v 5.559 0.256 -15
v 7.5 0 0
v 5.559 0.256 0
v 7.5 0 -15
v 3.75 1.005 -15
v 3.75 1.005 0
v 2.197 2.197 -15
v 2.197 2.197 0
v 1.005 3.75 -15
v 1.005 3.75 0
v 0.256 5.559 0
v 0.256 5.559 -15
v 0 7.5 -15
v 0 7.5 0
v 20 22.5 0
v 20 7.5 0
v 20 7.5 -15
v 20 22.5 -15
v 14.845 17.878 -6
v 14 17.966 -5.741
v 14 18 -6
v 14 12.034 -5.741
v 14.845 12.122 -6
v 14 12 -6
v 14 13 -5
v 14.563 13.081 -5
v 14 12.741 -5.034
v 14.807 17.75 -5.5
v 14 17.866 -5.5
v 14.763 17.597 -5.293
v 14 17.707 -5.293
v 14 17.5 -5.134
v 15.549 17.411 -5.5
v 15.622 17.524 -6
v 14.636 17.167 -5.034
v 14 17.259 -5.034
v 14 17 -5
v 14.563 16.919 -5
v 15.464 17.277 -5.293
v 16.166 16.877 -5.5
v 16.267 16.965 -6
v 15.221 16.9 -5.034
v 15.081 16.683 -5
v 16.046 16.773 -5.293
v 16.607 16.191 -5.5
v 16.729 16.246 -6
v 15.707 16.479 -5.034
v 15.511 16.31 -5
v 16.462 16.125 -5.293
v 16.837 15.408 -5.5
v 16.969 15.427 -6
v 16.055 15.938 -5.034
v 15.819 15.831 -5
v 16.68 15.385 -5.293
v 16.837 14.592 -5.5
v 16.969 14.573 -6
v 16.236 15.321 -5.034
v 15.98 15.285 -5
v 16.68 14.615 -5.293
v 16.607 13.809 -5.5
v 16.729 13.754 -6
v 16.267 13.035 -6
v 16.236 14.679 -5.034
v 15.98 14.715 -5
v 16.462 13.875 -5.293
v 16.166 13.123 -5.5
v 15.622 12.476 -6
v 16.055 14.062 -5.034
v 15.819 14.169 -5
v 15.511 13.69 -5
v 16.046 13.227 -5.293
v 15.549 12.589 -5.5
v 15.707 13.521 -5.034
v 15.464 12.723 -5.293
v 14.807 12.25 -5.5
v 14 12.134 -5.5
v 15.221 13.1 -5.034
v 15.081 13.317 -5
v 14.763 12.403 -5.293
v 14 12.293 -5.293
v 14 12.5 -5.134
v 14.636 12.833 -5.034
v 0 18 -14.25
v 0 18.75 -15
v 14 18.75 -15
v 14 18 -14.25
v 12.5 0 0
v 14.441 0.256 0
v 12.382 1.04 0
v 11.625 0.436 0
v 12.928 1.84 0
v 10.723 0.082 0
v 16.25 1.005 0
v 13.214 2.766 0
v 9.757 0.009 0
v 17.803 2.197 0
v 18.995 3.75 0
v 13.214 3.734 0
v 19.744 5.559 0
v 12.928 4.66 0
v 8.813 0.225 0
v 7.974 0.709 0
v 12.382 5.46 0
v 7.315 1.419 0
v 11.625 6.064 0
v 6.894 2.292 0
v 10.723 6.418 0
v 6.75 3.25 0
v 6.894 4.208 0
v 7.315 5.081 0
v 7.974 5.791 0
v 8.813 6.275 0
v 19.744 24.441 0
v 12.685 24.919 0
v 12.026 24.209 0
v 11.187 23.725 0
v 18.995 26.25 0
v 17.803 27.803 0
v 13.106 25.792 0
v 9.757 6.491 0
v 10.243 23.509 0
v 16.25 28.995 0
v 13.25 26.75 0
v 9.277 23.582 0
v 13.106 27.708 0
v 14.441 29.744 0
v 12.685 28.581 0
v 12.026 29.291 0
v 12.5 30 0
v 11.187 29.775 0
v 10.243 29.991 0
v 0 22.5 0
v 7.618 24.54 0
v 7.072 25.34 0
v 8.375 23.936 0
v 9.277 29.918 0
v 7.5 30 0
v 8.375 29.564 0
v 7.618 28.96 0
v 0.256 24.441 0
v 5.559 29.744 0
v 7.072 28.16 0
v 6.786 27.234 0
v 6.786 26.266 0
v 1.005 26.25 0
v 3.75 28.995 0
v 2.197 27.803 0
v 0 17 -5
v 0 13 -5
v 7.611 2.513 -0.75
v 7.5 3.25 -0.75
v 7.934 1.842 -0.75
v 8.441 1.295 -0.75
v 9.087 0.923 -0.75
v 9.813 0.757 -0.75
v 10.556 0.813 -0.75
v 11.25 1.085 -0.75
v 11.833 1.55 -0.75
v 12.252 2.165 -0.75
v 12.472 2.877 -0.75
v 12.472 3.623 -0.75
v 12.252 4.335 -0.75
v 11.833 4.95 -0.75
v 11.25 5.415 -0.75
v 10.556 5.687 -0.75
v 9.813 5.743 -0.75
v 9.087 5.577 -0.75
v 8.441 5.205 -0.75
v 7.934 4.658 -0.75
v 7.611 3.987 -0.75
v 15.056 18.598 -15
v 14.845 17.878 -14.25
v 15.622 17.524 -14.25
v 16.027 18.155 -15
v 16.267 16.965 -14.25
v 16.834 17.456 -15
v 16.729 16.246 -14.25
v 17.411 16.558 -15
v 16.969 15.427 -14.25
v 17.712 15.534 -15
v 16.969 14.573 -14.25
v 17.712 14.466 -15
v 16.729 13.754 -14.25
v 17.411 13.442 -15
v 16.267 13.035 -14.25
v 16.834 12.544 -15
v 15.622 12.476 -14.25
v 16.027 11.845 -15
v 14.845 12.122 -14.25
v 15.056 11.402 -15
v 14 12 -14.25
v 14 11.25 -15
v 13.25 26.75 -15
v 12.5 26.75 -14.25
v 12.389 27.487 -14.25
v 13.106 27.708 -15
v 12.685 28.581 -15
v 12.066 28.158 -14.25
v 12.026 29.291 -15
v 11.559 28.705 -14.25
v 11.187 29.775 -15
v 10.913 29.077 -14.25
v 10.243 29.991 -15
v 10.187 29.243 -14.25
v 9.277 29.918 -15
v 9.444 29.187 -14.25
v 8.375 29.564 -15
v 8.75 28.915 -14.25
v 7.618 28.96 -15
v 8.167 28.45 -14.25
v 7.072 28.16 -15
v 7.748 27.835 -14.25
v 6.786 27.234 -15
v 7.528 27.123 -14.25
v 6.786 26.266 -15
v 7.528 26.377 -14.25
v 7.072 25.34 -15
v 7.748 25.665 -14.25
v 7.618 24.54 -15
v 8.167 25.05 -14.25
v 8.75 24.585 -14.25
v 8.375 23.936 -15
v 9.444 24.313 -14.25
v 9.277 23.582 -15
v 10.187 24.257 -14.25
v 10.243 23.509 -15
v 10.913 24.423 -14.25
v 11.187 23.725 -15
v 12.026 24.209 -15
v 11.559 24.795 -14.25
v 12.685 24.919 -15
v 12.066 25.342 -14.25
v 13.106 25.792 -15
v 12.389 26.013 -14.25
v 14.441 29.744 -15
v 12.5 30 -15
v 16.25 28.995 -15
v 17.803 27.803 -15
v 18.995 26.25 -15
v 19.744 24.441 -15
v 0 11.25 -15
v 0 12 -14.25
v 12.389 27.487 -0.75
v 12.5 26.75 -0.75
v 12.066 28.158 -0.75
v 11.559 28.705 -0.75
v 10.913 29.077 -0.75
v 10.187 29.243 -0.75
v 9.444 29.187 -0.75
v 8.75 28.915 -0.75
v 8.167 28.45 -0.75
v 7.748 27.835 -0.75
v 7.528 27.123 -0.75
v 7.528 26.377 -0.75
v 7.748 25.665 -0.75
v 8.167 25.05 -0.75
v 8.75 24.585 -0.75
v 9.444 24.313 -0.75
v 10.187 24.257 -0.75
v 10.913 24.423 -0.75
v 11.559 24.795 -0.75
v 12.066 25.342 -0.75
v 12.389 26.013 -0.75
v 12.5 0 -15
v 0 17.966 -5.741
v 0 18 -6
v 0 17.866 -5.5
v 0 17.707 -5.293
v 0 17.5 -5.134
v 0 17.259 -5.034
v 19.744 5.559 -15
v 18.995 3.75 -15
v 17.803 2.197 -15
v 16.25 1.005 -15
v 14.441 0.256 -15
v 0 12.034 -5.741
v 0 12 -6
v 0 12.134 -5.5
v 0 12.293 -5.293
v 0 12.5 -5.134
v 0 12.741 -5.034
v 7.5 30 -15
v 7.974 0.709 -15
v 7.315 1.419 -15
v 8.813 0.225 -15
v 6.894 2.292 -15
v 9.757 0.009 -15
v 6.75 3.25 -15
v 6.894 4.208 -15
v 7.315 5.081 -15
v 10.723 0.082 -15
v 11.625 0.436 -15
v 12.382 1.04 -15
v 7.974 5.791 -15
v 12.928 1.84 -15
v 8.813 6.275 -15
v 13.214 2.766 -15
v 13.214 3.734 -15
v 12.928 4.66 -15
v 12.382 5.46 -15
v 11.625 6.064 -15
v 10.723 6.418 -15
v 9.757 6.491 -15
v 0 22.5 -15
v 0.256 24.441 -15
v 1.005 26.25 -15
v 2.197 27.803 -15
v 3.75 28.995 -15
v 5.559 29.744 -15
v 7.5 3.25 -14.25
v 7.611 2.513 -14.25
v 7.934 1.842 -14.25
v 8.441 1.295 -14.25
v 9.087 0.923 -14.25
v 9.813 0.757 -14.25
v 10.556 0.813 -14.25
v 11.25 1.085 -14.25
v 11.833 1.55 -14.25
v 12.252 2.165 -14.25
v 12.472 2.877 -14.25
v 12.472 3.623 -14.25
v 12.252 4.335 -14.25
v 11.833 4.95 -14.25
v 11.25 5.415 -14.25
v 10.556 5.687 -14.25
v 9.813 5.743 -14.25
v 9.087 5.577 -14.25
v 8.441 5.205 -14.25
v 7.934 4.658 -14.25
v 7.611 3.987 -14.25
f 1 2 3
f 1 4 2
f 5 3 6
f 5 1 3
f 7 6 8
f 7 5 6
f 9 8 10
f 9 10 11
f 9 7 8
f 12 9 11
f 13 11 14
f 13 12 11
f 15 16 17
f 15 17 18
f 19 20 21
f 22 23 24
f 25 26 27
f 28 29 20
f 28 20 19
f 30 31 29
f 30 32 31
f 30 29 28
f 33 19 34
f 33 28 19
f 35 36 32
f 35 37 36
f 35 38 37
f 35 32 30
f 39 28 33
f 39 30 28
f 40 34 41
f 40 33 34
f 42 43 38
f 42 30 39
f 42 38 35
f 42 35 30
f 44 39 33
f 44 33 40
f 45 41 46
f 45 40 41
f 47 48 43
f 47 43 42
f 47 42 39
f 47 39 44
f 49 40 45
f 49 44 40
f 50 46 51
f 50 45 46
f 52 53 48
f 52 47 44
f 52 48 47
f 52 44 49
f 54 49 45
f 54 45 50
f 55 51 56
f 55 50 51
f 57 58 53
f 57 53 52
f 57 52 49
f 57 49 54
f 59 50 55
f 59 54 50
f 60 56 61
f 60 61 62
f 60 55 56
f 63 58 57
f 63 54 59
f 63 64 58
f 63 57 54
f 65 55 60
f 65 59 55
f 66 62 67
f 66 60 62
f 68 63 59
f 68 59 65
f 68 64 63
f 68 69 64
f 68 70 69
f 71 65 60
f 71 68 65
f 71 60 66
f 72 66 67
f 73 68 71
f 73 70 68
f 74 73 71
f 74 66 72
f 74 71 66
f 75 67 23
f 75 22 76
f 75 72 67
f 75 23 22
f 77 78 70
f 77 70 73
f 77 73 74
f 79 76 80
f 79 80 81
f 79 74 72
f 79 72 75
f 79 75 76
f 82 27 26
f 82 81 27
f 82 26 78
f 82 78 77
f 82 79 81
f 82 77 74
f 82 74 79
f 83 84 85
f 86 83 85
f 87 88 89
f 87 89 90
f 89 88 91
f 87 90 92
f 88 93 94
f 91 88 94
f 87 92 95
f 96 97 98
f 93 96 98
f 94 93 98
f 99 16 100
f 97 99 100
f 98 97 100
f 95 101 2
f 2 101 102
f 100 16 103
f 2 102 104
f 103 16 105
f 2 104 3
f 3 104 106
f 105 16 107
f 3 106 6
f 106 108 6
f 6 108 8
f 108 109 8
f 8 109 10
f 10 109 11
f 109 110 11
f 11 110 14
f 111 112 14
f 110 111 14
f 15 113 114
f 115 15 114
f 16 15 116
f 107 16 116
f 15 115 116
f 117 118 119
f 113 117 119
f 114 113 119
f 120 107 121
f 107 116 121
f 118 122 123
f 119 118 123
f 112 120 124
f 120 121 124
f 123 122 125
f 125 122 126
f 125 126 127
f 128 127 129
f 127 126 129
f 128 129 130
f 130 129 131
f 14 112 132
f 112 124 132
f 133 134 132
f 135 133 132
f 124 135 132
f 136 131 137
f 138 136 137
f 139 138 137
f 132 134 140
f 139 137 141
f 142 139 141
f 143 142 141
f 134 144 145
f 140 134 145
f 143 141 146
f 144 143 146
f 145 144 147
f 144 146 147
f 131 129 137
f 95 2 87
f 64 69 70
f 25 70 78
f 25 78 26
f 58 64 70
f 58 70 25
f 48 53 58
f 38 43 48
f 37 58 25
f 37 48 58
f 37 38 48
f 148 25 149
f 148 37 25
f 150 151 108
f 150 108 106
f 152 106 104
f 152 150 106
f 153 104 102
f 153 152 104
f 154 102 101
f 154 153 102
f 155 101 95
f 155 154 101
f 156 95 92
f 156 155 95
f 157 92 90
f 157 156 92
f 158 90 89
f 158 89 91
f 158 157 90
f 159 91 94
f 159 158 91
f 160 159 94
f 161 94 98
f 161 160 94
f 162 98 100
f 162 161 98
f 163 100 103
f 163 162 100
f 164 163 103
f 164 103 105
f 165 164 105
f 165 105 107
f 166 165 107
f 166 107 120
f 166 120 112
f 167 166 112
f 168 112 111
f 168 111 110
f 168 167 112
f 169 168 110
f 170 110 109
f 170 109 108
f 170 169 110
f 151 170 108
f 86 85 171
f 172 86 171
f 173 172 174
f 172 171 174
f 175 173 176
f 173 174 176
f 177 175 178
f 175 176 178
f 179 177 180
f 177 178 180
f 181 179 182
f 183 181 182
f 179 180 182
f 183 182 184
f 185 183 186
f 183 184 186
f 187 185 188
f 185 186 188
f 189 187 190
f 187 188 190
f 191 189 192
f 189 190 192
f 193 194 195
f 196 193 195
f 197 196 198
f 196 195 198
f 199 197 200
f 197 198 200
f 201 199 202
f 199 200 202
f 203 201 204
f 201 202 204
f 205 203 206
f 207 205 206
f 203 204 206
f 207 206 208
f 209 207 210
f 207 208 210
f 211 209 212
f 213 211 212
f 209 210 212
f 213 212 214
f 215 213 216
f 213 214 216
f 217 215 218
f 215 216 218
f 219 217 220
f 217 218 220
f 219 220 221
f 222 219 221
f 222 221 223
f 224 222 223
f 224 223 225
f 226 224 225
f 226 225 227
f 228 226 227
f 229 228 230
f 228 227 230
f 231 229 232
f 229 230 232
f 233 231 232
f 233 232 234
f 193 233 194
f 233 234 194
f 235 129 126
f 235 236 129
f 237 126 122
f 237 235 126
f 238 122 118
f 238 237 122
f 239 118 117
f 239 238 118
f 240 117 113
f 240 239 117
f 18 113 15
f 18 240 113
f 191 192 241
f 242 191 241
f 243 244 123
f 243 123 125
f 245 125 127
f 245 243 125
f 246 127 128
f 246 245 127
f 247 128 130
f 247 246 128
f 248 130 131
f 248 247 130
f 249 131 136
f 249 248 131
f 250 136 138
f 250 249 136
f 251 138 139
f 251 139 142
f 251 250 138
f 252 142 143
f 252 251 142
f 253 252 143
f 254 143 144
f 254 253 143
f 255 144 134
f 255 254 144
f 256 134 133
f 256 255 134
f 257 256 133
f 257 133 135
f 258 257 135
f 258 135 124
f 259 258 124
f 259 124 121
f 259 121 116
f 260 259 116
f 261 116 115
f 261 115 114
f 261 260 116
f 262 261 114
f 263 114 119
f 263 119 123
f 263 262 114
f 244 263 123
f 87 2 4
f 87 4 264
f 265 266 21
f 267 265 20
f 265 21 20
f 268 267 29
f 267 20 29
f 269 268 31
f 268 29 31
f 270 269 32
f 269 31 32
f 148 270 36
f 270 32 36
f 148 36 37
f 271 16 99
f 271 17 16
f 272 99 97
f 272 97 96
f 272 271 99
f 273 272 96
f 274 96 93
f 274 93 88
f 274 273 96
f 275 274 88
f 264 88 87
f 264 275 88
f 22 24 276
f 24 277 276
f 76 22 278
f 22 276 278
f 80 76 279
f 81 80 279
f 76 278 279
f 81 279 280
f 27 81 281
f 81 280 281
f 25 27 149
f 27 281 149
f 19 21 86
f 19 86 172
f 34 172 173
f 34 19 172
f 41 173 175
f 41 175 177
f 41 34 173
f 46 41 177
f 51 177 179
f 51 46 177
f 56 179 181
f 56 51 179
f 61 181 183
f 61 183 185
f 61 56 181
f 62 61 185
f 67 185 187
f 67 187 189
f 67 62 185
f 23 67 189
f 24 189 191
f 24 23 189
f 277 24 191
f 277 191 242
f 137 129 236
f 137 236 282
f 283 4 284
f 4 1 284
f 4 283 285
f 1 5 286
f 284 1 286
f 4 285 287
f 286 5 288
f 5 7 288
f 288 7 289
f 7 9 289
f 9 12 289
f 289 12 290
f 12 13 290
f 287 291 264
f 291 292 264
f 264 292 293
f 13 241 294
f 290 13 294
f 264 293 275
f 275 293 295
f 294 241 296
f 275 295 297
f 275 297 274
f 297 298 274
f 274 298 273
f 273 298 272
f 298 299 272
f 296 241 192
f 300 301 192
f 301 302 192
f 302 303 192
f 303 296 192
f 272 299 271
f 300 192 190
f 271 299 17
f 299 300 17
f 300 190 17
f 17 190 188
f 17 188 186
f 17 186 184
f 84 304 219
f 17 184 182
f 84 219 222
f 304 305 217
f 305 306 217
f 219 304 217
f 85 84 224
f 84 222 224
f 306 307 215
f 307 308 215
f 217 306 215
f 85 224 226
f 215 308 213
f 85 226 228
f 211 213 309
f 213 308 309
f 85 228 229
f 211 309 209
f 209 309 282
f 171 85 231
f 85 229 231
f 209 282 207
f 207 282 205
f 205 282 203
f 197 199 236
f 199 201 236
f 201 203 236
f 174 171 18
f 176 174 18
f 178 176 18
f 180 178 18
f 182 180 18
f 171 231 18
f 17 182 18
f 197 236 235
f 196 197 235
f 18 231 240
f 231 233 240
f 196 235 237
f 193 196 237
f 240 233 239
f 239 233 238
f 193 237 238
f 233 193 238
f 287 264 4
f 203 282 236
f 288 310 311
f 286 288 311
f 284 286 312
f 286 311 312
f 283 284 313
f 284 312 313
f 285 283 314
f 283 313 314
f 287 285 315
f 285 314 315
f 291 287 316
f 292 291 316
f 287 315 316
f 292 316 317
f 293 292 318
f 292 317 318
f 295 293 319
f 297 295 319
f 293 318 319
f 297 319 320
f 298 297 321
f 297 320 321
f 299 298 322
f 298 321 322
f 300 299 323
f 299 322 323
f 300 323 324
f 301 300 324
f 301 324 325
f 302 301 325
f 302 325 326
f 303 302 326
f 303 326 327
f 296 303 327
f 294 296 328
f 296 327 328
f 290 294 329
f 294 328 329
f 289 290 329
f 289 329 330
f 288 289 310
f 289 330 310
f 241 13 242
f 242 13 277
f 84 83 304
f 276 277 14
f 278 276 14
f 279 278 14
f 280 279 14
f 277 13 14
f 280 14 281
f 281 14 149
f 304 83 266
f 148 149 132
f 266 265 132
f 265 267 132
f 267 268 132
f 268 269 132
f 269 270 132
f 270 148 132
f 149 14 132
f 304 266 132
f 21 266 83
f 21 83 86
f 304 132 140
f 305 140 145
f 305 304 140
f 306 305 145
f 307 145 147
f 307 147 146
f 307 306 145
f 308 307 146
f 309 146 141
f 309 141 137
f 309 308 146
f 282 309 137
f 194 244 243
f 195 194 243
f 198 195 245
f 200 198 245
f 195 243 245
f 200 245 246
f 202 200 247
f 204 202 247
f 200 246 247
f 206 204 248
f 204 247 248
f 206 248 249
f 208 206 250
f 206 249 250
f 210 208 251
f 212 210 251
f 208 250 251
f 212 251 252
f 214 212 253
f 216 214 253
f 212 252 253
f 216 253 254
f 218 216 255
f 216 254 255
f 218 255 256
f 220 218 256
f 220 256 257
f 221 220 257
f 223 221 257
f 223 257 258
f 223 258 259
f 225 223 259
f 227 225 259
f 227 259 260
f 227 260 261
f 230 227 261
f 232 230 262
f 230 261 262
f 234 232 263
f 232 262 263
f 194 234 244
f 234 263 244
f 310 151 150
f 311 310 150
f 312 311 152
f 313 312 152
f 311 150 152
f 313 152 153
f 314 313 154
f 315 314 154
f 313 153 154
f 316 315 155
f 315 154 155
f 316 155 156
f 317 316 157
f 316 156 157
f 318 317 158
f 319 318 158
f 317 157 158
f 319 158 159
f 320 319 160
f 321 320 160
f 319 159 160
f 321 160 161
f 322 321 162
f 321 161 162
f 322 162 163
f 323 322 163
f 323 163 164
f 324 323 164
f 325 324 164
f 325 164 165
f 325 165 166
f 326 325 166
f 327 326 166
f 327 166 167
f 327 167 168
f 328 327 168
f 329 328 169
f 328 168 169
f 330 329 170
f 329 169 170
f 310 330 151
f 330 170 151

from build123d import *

# Parameters (mm, degrees)
CROQUIS1_R              = 2.5
BRIDA_BASE1_DEPTH       = 15
REDONDEO1_R             = 7.5
CHAFL_N1_SIZE           = 0.75
SALIENTE_EXTRUIR1_DEPTH = 5
REDONDEO2_R             = 1


# Sheet-metal steps are written as plain solids
with BuildPart() as part:
    # Croquis1 → Brida base1 (new body)
    with BuildSketch(Plane.XY):
        with BuildLine():
            Line((0, 30), (0, 18))
            Line((0, 18), (14, 18))
            ThreePointArc((14, 18), (17, 15), (14, 12))
            Line((14, 12), (0, 12))
            Line((0, 12), (0, 0))
            Line((0, 0), (20, 0))
            Line((20, 0), (20, 30))
            Line((20, 30), (0, 30))
        make_face()
        with Locations(Location((10, 3.25, 0), (0, 0, 180))):
            Circle(CROQUIS1_R, mode=Mode.SUBTRACT)
        with Locations((10, 26.75)):
            Circle(CROQUIS1_R, mode=Mode.SUBTRACT)
    extrude(amount=-BRIDA_BASE1_DEPTH)

    # Redondeo1
    redondeo1_edges = [part.edges().sort_by_distance(p)[0] for p in [
        (0, 30, -7.5),
        (20, 30, -7.5),
        (20, 0, -7.5),
        (0, 0, -7.5),
    ]]
    fillet(redondeo1_edges, radius=REDONDEO1_R)

    # Chaflán1
    chafl_n1_edges = [part.edges().sort_by_distance(p)[0] for p in [
        (7, 18, -15),
        (12.5, 3.25, -15),
        (12.5, 3.25, 0),
        (17, 15, -15),
        (7.5, 26.75, -15),
        (7.5, 26.75, 0),
        (7, 12, -15),
    ]]
    chamfer(chafl_n1_edges, length=CHAFL_N1_SIZE - 0.0001)  # a hair under: the kernel refuses the full size

    # Croquis2 → Saliente-Extruir1 (add)
    with BuildSketch(Plane(origin=(0, 0, 0), x_dir=(-1, 0, 0), z_dir=(0, 0, -1))):
        with BuildLine():
            Line((0, 18), (-14, 18))
            ThreePointArc((-14, 18), (-17, 15), (-14, 12))
            Line((-14, 12), (0, 12))
            Line((0, 12), (0, 18))
        make_face()
    extrude(amount=SALIENTE_EXTRUIR1_DEPTH)

    # Redondeo2
    redondeo2_edges = [part.edges().sort_by_distance(p)[0] for p in [
        (7, 18, -5),
        (17, 15, -5),
        (7, 12, -5),
    ]]
    fillet(redondeo2_edges, radius=REDONDEO2_R)


solid = part.part
